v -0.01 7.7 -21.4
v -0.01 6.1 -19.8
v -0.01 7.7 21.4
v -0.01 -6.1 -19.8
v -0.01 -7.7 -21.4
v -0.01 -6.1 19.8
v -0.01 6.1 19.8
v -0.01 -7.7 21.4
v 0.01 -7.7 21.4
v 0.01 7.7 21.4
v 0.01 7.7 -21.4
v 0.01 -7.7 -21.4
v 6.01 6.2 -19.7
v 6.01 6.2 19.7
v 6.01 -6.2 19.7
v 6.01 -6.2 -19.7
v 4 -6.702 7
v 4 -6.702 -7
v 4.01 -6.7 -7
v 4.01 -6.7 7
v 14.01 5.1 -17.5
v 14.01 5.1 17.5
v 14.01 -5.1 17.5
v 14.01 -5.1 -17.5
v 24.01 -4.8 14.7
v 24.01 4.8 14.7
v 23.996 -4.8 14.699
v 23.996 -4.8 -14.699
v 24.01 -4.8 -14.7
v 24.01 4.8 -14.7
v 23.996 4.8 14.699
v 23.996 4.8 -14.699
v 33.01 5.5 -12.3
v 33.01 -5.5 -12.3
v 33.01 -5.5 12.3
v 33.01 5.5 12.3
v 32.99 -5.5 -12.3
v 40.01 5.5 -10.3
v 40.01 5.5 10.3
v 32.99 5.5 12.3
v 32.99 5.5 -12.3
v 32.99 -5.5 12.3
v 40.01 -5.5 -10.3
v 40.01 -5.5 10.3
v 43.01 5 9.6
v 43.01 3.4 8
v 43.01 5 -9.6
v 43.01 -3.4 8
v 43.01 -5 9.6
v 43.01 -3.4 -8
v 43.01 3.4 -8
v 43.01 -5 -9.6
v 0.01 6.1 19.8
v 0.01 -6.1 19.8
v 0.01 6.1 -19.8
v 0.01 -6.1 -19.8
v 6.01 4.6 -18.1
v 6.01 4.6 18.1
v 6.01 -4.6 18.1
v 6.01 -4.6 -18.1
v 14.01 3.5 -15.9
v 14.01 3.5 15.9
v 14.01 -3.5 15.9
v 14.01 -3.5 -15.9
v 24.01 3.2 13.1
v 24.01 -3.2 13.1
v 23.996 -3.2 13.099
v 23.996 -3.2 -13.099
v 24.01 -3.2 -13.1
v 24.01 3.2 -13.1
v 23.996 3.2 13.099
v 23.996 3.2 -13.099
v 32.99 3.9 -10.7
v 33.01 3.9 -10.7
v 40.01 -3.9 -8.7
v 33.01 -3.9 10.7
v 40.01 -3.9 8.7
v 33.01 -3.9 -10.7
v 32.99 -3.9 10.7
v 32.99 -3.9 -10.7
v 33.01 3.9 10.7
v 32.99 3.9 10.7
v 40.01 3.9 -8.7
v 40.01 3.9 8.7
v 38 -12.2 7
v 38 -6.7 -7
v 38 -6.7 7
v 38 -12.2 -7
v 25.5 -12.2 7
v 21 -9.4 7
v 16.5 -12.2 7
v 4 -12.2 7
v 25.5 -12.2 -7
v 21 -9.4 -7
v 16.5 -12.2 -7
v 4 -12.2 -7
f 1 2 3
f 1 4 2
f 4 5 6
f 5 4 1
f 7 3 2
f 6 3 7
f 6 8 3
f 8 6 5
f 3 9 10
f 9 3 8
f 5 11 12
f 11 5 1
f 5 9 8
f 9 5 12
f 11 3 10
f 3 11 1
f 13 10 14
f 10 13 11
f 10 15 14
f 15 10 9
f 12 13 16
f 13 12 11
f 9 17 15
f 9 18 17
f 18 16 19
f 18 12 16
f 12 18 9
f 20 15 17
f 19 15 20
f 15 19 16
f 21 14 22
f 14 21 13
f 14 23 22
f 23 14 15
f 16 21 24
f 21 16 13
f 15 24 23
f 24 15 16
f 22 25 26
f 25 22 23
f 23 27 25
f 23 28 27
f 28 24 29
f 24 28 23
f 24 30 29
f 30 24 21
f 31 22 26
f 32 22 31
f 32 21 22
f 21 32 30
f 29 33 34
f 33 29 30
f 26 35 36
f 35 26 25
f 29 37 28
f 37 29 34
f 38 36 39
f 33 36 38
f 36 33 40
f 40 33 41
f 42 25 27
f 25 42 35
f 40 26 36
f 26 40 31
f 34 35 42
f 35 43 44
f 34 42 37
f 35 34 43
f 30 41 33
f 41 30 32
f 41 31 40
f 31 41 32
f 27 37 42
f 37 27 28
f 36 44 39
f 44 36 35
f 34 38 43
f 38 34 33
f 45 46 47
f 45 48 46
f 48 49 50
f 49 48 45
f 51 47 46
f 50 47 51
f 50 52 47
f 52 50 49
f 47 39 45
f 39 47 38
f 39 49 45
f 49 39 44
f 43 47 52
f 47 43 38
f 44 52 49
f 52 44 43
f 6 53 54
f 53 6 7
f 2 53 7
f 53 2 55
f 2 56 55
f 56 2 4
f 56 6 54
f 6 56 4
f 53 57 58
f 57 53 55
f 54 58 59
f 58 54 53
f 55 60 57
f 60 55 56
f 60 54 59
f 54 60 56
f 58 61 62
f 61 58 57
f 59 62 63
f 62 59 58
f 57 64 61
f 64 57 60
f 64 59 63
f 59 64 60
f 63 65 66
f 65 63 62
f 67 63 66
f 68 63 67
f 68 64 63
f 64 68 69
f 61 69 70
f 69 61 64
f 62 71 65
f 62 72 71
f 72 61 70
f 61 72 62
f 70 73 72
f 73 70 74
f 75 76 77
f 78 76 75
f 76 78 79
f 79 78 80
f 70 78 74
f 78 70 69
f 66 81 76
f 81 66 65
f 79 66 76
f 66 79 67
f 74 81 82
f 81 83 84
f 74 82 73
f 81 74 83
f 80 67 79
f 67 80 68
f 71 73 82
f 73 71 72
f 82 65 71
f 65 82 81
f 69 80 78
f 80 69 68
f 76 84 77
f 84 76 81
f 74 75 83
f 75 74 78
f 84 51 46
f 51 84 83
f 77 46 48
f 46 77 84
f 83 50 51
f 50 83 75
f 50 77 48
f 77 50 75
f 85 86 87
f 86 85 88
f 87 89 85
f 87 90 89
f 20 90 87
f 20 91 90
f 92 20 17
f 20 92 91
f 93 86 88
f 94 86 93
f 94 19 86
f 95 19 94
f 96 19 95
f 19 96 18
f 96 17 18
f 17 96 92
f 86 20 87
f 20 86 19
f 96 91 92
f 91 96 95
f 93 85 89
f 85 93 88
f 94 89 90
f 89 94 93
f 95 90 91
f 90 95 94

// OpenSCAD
// =====================================================================
//  OMX_F gripper finger sleeve — slide-on cover
//  Fits over the fingertip blade (finger-local x = 22..65 mm).
//  Open end pushes onto the finger from the tip side and slides toward
//  the housing until seated.
//
//  variant : "vgroove" (cradle for cylinders, Φ4..16 mm)
//          : "cup"     (concave dimples for spheres / small parts)
//  mirror_y: false = link6 (motorized side)
//            true  = link7 (gear side)   — mirrored pair
//
//  Print suggestion: PLA/PETG, 0.2 mm layer, 4 walls, 30% infill.
//  Print orientation: lay flat on +Z face (grip pad facing up).
//  If too tight, increase `clearance` by 0.1. If too loose, decrease.
// =====================================================================

variant   = "vgroove";   // "vgroove" | "cup"
mirror_y  = false;

clearance = 0.4;         // gap between sleeve cavity and finger (per side)
wall      = 1.6;         // shell wall thickness
$fn       = 80;

// ---------------------------------------------------------------------
// Blade outer envelope (symmetrized, derived from STL cross-sections
// of follower_07_gripper_motorized.stl over finger-local x = 22..65 mm).
// Format: [x_from_sleeve_base, half_width_Y, half_height_Z]
// ---------------------------------------------------------------------
profile = [
  [ 0.0,  5.7, 19.4],
  [ 6.0,  4.2, 17.7],
  [14.0,  3.1, 15.5],
  [24.0,  2.8, 12.7],
  [33.0,  3.5, 10.3],
  [40.0,  3.5,  8.3],
  [43.0,  3.0,  7.6],
];
N = len(profile);
L = profile[N-1][0];        // total sleeve length along finger axis

// ---------------------------------------------------------------------
// Helpers — tapered solid built by chained hulls of thin slabs
// ---------------------------------------------------------------------
module slab(i, ey, ez) {
  s = profile[i];
  translate([s[0], 0, 0])
    cube([0.02, 2*(s[1]+ey), 2*(s[2]+ez)], center=true);
}
module taper(ey, ez) {
  for (i = [0 : N-2]) hull() { slab(i, ey, ez); slab(i+1, ey, ez); }
}

// ---------------------------------------------------------------------
// Shell = outer taper − inner cavity (cavity opens at x = 0)
// ---------------------------------------------------------------------
module shell() {
  difference() {
    taper(clearance + wall, clearance + wall);
    // base opening: cut through x = 0 face
    translate([-3, 0, 0])
      cube([3.02,
            2*(profile[0][1] + clearance),
            2*(profile[0][2] + clearance)], center=true);
    // inner cavity matching blade with clearance
    taper(clearance, clearance);
  }
}

// ---------------------------------------------------------------------
// Grip pad on −Y face (the "inner" face that meets the partner finger
// for link6; mirrored for link7 via the top-level mirror).
// ---------------------------------------------------------------------
pad_len = 34;
pad_h   = 14;       // Z extent
pad_thk = 4.5;      // protrusion in −Y from outer wall
pad_x0  = 4;

pad_y_attach = -(profile[0][1] + clearance + wall);  // pad's +Y face (into shell)
pad_y_grip   = pad_y_attach - pad_thk;               // pad's −Y face (gripping surface)

module pad_block() {
  // overlap +1 mm into shell so the union is robust
  translate([pad_x0, pad_y_grip, -pad_h/2])
    cube([pad_len, pad_thk + 1.0, pad_h]);
}

// V-groove: triangular notch running along Z, centered along X on the pad.
// Cylinder lies vertically (along Z) and seats in the V.
module v_cutter() {
  groove_w = 9.0;     // width at the grip surface
  groove_d = 2.8;     // depth into pad
  translate([pad_x0 + pad_len/2, pad_y_grip, -pad_h/2 - 2])
    linear_extrude(height = pad_h + 4)
      polygon([
        [-groove_w/2, 0     ],   // left lip on grip surface
        [ groove_w/2, 0     ],   // right lip
        [ 0,          groove_d]  // apex, inward into pad
      ]);
}

// Cup: two hemispherical dimples on grip face for small spheres / parts.
module cup_cutter() {
  r_big   = 4.5;   // ~Φ9 cavity → holds Φ6–10 mm objects
  r_small = 3.0;   // ~Φ6 cavity → holds Φ3–6 mm objects
  // sphere center sits ON the grip surface → cuts a hemisphere into the pad
  translate([pad_x0 + 11, pad_y_grip, 0]) sphere(r = r_big);
  translate([pad_x0 + 24, pad_y_grip, 0]) sphere(r = r_small);
}

// ---------------------------------------------------------------------
// Assembly
// ---------------------------------------------------------------------
module sleeve() {
  difference() {
    union() {
      shell();
      pad_block();
    }
    if (variant == "vgroove") v_cutter();
    else if (variant == "cup") cup_cutter();
  }
}

// Mirror for link7 if requested
if (mirror_y) mirror([0, 1, 0]) sleeve();
else sleeve();
